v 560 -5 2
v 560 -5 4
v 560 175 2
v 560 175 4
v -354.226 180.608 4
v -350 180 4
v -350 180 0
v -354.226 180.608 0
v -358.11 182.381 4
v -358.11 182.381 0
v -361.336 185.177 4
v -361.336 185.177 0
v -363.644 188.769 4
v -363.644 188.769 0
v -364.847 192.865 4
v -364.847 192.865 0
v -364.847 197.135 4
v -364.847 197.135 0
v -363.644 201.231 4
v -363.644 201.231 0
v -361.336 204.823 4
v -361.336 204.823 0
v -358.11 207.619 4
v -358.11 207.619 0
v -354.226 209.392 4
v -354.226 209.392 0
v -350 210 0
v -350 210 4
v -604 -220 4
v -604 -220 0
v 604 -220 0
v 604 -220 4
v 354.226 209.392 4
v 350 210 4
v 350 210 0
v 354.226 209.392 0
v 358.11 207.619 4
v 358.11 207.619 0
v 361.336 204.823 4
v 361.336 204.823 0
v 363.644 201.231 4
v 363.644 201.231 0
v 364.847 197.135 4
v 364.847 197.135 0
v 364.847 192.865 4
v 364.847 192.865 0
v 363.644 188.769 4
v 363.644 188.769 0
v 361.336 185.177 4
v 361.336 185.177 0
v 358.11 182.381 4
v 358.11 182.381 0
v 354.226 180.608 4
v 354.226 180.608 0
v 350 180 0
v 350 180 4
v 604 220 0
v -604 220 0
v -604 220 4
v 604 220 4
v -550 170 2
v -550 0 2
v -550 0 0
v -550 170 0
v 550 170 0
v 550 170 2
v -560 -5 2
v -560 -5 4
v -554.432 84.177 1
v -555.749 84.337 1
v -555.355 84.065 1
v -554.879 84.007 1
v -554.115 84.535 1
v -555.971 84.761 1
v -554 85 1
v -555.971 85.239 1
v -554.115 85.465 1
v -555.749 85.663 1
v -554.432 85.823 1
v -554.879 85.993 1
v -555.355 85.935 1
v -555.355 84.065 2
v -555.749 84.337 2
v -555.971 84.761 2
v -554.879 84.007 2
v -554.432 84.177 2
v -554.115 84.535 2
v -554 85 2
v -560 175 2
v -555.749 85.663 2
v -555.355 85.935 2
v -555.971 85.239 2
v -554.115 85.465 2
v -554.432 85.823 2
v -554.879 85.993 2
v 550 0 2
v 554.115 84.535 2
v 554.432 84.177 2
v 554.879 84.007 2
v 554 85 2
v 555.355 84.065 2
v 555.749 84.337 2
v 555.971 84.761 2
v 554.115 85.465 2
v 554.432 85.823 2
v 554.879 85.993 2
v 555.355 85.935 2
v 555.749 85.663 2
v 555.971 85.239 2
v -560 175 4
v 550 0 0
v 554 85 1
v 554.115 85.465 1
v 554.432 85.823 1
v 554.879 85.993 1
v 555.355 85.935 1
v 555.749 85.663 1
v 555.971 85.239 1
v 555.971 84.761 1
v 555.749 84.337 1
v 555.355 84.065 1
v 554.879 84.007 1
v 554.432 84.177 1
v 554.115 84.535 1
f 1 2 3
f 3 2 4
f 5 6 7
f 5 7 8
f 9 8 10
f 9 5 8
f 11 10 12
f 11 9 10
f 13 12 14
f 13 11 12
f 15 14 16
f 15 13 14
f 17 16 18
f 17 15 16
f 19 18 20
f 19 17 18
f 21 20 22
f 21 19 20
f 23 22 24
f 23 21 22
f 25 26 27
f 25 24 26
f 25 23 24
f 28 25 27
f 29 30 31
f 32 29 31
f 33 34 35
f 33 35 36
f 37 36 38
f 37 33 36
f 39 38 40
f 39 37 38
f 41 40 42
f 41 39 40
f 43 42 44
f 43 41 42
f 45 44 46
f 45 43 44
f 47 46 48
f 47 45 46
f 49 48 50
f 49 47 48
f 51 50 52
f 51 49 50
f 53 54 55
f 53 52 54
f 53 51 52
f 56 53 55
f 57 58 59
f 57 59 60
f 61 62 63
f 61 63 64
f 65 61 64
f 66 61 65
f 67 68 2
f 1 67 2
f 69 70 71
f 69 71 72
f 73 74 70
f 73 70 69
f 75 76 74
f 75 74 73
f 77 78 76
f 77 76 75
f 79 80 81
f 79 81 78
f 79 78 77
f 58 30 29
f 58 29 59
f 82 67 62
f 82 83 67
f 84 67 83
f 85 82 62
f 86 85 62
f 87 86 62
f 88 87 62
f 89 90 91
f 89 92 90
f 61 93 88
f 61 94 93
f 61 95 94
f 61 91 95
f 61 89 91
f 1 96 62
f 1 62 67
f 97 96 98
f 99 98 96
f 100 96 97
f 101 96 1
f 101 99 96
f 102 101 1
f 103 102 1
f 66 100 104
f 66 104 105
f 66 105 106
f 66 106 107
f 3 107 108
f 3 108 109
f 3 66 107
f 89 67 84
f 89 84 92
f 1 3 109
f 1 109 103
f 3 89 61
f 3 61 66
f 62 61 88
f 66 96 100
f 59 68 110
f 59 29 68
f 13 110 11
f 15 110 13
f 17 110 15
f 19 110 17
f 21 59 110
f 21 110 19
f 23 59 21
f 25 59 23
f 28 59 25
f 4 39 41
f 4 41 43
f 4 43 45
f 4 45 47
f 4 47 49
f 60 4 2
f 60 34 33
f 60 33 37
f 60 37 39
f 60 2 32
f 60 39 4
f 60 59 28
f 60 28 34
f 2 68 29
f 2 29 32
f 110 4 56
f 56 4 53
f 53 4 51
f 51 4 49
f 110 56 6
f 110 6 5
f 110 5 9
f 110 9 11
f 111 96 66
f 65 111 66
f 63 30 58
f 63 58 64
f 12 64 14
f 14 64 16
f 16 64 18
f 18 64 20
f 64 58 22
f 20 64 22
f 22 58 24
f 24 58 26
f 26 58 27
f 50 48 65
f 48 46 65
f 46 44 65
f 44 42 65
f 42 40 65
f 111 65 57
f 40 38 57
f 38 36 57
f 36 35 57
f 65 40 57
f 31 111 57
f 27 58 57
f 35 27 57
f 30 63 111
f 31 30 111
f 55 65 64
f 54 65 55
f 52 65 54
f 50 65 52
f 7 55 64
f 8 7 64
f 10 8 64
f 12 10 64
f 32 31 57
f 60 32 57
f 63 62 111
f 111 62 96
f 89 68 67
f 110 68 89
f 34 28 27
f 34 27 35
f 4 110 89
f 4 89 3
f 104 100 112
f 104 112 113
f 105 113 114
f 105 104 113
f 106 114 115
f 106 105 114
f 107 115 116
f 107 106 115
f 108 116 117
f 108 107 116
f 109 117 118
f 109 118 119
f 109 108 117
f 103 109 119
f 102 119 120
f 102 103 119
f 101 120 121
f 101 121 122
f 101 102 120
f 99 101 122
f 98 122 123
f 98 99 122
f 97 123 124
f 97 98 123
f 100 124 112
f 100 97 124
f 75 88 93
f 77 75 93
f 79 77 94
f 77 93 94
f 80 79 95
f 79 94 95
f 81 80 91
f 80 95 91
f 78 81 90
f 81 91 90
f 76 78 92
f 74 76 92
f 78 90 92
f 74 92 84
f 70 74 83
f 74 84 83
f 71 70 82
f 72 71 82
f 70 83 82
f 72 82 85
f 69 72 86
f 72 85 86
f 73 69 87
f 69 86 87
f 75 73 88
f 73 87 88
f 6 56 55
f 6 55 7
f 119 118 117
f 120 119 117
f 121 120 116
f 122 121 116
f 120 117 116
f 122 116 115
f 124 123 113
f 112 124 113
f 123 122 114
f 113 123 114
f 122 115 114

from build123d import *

# Parameters (mm, degrees)
SKETCH1_W           = 1208
SKETCH1_H           = 440
BOSS_EXTRUDE1_DEPTH = 4
CUT_EXTRUDE1_DEPTH  = 10
SKETCH3_W           = 1120
SKETCH3_H           = 180
CUT_EXTRUDE2_DEPTH  = 2
SKETCH4_W           = 1100
SKETCH4_H           = 170
CUT_EXTRUDE3_DEPTH  = 3
SKETCH5_R           = 1
CUT_EXTRUDE4_DEPTH  = 1


with BuildPart() as part:
    # Sketch1 → Boss-Extrude1 (new body)
    with BuildSketch(Plane.XY):
        Rectangle(SKETCH1_W, SKETCH1_H)
    extrude(amount=BOSS_EXTRUDE1_DEPTH)

    # Sketch2 → Cut-Extrude1 (cut)
    with BuildSketch(Plane.XY.offset(4)):
        with BuildLine():
            Line((-350, 210), (350, 210))
            ThreePointArc((350, 210), (365, 195), (350, 180))
            Line((350, 180), (-350, 180))
            ThreePointArc((-350, 180), (-365, 195), (-350, 210))
        make_face()
    extrude(amount=-CUT_EXTRUDE1_DEPTH, mode=Mode.SUBTRACT)

    # Sketch3 → Cut-Extrude2 (cut)
    with BuildSketch(Plane.XY.offset(4)):
        with Locations((0, 85)):
            Rectangle(SKETCH3_W, SKETCH3_H)
    extrude(amount=-CUT_EXTRUDE2_DEPTH, mode=Mode.SUBTRACT)

    # Sketch4 → Cut-Extrude3 (cut, through all)
    with BuildSketch(Plane.XY.offset(2)):
        with Locations((0, 85)):
            Rectangle(SKETCH4_W, SKETCH4_H)
    extrude(amount=-CUT_EXTRUDE3_DEPTH, mode=Mode.SUBTRACT)

    # Sketch5 → Cut-Extrude4 (cut)
    with BuildSketch(Plane.XY.offset(2)):
        with Locations((-555, 85)):
            Circle(SKETCH5_R)
    cut_extrude4 = extrude(amount=-CUT_EXTRUDE4_DEPTH, mode=Mode.SUBTRACT)

    # Mirror1: Cut-Extrude4 across plane
    add(cut_extrude4.mirror(Plane(origin=(0, 0, 0), x_dir=(0, 0, 1), z_dir=(1, 0, 0))), mode=Mode.SUBTRACT)


solid = part.part
